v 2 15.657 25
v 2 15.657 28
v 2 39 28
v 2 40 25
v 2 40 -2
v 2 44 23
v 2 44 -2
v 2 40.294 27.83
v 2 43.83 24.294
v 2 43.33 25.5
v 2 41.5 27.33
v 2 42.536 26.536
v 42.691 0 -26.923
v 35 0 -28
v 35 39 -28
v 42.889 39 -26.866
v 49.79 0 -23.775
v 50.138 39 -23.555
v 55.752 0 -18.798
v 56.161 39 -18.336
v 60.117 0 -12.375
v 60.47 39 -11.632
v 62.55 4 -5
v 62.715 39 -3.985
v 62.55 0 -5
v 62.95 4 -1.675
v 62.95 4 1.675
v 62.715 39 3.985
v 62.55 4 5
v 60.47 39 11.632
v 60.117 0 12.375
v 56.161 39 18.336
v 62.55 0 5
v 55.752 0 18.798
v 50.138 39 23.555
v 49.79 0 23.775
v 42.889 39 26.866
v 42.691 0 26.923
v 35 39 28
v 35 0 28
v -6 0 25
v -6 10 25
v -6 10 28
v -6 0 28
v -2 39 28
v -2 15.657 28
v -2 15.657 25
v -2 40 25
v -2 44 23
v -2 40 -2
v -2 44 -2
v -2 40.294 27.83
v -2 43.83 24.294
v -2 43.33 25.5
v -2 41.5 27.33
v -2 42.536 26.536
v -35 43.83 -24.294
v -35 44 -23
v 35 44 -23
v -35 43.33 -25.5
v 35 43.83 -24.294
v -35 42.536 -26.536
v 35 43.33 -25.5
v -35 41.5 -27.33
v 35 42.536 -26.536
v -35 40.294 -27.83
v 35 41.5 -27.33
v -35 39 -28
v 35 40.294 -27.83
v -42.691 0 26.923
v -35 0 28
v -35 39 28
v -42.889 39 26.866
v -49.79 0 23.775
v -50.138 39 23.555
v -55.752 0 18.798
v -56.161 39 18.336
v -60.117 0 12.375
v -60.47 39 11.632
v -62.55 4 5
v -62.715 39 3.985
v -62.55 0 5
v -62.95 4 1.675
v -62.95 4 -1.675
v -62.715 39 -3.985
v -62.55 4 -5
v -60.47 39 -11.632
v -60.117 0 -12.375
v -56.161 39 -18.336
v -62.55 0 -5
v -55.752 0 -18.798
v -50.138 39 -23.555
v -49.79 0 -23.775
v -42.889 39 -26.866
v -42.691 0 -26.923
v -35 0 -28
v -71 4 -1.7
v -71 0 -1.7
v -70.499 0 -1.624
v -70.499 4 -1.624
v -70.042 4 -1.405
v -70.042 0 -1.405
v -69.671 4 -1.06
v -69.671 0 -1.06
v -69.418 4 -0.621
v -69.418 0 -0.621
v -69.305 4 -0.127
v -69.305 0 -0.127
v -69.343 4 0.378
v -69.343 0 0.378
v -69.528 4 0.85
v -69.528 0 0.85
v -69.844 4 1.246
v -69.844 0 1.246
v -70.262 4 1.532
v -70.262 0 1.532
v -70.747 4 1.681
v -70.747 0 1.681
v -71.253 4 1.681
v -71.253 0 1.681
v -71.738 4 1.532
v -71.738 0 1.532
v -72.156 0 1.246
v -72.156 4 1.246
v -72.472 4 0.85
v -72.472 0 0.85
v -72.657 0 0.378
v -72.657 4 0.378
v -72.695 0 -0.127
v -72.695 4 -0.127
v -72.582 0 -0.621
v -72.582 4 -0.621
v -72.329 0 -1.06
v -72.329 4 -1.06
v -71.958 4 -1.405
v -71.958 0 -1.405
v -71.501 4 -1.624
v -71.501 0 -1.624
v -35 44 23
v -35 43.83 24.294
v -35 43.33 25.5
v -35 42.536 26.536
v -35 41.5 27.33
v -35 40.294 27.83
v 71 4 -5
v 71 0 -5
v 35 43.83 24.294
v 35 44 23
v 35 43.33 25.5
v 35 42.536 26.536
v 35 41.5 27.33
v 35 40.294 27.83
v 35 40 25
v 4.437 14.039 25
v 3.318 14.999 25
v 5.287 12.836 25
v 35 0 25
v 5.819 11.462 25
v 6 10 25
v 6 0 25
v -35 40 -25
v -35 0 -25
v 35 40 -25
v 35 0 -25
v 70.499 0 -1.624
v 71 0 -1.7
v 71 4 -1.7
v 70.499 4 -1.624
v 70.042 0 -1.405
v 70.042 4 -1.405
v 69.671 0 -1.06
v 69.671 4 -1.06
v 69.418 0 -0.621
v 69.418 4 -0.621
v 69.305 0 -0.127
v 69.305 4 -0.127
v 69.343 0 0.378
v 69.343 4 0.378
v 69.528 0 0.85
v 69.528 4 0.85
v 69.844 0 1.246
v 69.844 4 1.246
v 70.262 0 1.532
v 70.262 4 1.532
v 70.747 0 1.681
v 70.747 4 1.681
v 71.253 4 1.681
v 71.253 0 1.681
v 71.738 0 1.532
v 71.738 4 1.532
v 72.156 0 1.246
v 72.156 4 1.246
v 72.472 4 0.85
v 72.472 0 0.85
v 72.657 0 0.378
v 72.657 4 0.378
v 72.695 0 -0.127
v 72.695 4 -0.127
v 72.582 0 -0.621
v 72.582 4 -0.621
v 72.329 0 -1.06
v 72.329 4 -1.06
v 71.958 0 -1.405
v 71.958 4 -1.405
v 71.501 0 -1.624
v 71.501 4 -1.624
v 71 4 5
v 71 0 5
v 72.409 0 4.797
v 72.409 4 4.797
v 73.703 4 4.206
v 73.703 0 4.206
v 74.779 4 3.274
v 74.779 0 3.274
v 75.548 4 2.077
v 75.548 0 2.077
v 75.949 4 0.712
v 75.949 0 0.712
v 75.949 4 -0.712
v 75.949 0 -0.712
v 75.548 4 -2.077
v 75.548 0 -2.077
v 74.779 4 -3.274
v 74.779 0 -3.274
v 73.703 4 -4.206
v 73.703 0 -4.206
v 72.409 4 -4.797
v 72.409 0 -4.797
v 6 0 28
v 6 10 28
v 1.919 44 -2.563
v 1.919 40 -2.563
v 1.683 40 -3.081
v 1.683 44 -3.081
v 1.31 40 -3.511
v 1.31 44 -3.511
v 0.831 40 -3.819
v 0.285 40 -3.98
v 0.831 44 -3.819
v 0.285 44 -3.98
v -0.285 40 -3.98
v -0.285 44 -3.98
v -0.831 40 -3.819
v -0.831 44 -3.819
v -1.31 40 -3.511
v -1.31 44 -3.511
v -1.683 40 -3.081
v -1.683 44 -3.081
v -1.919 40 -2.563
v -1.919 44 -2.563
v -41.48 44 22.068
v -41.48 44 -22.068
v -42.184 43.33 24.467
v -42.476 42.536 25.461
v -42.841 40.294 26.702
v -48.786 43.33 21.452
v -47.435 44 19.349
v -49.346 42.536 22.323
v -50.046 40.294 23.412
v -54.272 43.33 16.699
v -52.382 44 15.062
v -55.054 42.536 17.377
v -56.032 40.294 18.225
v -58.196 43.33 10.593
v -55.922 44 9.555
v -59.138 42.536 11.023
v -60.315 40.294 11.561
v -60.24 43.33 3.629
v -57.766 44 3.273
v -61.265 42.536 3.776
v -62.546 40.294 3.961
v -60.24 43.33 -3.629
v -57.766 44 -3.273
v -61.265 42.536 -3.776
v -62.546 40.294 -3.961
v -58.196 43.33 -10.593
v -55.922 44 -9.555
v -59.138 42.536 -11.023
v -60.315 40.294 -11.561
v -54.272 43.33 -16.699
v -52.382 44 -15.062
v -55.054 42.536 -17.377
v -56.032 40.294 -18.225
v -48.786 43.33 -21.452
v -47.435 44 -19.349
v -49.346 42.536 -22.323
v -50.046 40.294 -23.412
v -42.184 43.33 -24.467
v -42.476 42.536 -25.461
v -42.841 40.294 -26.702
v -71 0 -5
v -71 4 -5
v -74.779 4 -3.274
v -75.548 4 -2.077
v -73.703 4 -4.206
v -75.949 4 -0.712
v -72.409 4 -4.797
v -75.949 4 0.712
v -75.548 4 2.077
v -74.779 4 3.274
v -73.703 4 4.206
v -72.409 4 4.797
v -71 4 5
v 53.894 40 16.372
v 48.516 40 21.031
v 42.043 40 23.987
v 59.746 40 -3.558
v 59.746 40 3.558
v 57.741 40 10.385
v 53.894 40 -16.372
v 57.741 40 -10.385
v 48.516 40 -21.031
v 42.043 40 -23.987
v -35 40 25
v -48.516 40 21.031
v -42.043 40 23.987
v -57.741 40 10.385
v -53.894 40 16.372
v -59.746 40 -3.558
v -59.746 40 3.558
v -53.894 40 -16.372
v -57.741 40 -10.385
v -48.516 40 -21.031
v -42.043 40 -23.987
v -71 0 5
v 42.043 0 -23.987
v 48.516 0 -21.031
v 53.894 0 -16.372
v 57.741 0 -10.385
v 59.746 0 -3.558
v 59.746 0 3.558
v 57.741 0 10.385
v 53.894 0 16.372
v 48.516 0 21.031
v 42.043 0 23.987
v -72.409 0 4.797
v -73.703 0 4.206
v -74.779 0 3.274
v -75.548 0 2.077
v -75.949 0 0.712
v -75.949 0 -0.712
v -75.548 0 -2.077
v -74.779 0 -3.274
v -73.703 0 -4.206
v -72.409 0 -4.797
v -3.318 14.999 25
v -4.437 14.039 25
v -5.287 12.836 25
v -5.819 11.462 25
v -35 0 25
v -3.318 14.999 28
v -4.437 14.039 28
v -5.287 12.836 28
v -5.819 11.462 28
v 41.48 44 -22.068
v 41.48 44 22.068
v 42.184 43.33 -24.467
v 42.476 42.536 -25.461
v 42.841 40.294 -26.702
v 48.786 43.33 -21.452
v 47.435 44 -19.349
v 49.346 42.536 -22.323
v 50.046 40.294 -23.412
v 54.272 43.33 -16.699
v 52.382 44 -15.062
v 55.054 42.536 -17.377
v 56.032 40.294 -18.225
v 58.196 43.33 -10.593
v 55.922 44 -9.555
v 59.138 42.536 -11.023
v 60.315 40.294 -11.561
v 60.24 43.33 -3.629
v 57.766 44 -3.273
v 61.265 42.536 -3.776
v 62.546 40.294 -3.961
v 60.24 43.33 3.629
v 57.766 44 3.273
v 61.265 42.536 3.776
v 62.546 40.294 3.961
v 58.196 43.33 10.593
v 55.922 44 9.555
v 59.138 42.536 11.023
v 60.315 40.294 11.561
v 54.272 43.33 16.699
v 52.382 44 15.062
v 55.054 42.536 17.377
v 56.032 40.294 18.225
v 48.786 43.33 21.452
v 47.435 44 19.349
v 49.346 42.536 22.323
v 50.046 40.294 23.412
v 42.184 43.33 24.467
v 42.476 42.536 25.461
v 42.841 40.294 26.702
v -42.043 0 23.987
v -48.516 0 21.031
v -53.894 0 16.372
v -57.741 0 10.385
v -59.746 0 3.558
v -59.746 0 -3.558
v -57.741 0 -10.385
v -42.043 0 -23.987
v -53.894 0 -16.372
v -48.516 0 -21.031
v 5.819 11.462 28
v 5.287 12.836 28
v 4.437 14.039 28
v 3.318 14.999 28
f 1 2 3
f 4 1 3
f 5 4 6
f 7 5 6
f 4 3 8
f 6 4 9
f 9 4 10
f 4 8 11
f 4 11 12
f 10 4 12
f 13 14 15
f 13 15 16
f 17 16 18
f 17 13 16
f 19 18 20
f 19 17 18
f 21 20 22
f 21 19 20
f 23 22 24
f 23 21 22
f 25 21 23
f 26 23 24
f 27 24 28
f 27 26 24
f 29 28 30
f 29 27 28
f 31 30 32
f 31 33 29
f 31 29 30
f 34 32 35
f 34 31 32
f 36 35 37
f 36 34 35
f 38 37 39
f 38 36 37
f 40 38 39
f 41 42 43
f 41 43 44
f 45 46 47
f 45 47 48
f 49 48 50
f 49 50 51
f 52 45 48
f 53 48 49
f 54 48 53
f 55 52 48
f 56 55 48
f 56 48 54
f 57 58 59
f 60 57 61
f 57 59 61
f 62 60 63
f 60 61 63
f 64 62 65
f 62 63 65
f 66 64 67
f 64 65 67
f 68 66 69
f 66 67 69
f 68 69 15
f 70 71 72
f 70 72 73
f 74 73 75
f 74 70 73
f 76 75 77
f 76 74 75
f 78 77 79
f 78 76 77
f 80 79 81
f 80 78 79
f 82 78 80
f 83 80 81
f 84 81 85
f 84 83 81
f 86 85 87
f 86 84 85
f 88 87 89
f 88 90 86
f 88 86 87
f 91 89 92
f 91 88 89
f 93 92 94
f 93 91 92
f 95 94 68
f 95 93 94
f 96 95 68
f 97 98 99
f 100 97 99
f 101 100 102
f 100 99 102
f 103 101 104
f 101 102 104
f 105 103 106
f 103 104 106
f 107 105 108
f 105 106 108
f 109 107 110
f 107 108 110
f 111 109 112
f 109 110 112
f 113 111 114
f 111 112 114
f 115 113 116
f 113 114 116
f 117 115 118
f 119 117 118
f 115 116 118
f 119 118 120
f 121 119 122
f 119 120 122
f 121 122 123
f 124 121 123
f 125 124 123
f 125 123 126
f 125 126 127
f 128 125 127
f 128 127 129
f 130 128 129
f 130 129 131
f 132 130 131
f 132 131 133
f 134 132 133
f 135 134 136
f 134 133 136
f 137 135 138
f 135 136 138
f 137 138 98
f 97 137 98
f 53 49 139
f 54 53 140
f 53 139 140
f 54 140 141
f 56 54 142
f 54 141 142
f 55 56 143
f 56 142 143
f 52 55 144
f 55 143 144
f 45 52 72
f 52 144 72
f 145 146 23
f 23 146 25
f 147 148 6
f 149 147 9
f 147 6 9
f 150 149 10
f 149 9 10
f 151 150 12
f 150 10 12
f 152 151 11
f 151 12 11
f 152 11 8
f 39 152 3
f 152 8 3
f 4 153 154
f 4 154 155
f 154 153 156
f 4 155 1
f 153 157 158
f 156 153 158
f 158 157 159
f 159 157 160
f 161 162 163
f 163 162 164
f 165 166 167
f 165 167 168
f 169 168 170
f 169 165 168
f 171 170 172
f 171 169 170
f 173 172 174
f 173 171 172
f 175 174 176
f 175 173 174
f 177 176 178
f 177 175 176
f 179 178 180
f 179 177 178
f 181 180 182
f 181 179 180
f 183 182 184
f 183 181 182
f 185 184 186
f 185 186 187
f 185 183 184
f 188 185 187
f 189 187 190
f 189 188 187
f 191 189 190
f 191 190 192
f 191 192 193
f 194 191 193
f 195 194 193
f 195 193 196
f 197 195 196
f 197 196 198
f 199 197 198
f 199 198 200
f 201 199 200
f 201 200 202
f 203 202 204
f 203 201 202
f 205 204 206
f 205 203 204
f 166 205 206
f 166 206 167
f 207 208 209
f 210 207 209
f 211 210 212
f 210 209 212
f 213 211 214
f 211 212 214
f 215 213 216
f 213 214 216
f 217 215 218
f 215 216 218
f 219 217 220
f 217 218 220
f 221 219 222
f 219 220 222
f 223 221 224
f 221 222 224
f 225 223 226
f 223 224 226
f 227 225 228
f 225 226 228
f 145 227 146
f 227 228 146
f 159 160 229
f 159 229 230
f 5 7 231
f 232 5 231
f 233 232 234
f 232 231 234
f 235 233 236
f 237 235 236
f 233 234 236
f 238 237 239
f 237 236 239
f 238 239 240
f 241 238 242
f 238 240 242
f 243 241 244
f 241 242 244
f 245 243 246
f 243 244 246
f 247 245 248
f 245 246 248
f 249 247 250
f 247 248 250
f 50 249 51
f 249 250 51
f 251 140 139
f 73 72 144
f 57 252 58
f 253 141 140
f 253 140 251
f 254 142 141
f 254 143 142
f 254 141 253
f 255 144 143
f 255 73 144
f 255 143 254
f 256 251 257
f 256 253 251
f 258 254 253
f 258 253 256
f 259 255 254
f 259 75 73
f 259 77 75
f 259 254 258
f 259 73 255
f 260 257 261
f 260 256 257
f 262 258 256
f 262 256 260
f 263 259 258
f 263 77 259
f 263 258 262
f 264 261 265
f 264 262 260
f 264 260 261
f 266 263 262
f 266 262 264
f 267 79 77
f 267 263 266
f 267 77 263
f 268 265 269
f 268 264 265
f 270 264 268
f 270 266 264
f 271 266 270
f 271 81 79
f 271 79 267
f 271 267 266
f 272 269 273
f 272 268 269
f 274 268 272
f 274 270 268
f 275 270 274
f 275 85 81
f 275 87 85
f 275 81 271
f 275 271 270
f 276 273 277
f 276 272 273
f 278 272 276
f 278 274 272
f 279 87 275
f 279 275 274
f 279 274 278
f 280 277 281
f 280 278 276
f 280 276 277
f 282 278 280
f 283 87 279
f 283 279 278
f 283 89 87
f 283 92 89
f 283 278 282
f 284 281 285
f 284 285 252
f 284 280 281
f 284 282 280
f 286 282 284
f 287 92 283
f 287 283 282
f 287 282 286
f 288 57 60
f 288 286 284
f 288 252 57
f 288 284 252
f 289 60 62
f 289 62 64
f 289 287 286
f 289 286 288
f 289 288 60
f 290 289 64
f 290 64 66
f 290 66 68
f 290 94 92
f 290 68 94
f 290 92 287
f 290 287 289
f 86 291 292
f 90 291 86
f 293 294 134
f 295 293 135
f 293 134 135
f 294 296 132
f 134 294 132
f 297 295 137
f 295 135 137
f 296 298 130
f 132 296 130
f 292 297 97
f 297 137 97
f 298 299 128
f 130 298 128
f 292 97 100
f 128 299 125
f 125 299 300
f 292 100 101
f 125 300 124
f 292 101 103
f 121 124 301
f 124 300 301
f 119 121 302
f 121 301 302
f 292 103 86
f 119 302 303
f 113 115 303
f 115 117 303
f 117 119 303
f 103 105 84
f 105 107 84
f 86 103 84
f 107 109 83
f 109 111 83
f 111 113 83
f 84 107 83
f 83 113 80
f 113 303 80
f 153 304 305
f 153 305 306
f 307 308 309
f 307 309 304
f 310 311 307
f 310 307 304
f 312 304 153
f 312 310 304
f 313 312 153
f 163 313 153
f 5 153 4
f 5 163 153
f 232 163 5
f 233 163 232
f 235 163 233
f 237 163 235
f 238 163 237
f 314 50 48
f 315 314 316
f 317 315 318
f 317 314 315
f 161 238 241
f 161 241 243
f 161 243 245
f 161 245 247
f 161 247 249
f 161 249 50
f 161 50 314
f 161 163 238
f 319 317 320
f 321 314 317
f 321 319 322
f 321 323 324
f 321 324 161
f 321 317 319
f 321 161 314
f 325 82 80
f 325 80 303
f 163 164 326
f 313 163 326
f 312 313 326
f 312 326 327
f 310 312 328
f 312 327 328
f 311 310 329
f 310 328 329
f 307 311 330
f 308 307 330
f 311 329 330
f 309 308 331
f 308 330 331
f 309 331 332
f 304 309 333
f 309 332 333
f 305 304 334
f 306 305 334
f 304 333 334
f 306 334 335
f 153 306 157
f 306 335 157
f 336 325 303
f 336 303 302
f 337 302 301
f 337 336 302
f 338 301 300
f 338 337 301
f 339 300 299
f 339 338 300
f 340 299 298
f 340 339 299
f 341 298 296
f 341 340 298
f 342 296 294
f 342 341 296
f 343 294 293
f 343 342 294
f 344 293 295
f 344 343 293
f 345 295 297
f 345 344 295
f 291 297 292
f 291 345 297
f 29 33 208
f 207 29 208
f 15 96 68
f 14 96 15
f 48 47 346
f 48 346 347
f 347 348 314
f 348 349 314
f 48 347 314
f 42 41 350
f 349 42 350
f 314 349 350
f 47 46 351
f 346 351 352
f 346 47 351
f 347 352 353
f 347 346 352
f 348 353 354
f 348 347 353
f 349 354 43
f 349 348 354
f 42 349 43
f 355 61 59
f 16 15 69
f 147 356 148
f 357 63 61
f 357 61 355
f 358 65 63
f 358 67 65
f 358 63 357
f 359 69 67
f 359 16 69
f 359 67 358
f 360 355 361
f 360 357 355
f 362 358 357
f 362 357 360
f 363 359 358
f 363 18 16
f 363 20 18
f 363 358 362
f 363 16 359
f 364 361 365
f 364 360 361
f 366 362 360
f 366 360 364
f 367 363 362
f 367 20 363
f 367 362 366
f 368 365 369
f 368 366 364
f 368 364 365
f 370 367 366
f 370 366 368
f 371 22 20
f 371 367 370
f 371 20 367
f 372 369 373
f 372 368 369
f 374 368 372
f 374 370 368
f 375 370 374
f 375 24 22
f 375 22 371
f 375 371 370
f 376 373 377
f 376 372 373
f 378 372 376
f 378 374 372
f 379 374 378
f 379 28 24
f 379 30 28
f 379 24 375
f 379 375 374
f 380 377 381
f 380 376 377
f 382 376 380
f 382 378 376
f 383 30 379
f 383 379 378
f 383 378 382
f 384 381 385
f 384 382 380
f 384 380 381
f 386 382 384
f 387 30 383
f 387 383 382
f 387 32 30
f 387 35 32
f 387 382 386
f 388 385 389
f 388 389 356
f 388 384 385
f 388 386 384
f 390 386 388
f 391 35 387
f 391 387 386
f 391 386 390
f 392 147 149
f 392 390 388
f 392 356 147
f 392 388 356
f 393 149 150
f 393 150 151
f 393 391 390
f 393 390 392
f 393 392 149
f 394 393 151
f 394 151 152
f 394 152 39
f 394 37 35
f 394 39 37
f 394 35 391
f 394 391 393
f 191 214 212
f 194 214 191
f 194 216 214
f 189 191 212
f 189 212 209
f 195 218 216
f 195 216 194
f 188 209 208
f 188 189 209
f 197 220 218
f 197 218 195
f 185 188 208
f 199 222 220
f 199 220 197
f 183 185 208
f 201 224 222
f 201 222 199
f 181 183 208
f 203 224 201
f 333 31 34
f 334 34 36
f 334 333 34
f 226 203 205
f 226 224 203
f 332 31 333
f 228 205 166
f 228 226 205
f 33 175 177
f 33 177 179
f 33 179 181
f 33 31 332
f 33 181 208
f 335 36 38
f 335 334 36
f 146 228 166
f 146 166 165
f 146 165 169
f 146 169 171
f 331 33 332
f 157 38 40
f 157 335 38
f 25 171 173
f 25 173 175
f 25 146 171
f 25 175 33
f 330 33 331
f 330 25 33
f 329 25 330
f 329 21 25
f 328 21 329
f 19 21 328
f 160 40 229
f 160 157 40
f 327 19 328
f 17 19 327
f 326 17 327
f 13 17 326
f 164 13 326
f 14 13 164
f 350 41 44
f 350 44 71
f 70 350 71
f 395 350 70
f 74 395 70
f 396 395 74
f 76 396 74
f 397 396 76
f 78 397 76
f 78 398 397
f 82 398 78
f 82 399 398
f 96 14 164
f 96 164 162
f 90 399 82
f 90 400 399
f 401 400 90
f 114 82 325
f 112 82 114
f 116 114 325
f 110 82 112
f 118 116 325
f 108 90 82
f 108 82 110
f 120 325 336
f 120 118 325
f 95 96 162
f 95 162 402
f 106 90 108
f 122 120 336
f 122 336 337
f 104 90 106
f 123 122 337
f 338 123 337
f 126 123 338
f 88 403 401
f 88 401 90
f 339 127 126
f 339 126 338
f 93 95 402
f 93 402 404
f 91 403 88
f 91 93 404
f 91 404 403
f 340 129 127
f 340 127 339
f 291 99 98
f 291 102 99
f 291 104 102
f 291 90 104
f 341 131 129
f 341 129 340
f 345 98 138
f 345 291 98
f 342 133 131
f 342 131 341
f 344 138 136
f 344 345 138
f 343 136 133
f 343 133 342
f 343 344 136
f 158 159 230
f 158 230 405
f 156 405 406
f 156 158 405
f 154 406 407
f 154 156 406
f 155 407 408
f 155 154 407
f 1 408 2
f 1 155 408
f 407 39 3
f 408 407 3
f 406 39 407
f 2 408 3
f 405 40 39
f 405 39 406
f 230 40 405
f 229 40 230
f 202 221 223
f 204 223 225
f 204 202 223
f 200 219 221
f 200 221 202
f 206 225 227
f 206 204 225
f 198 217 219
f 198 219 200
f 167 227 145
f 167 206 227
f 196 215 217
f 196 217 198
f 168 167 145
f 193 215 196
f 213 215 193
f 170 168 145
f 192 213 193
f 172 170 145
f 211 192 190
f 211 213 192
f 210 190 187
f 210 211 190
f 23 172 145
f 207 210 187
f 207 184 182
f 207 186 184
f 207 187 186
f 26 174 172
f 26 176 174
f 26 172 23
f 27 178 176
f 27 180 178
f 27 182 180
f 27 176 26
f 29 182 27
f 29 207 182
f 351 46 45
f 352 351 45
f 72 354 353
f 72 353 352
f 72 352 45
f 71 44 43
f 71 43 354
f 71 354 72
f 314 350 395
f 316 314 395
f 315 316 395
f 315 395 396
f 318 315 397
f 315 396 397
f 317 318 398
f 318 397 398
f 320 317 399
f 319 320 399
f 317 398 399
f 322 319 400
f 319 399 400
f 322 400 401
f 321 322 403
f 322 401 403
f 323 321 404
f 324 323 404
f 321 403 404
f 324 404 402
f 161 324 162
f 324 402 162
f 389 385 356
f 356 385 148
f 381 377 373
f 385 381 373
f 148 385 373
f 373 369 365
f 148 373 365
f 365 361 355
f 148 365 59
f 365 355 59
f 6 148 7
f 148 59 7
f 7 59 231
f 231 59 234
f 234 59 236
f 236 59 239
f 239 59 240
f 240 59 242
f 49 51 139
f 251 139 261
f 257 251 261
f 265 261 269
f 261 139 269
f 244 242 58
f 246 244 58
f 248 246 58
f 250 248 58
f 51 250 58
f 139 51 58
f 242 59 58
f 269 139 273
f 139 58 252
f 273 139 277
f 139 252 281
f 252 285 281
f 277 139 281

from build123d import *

# Parameters (mm, degrees)
BOSS_EXTRUDE1_DEPTH = 40
BOSS_EXTRUDE2_START = 40
BOSS_EXTRUDE2_DEPTH = 4
SKETCH3_R           = 1.7
BOSS_EXTRUDE3_DEPTH = 4
CUT_EXTRUDE1_DEPTH  = 4
SKETCH5_W           = 4
SKETCH5_H           = 44
CUT_EXTRUDE2_DEPTH  = 30
SKETCH6_R           = 2
CUT_EXTRUDE3_DEPTH  = 93.173748974
FILLET1_R           = 5


with BuildPart() as part:
    # Sketch1 → Boss-Extrude1 (new body)
    with BuildSketch(Plane(origin=(0, 0, 0), x_dir=(1, 0, 0), z_dir=(0, 1, 0))):
        with BuildLine():
            Line((-35, 28), (35, 28))
            ThreePointArc((35, 28), (63, 0), (35, -28))
            Line((35, -28), (-35, -28))
            ThreePointArc((-35, -28), (-63, 0), (-35, 28))
        make_face()
        with BuildLine():
            Line((-35, 25), (35, 25))
            ThreePointArc((35, 25), (60, 0), (35, -25))
            Line((35, -25), (-35, -25))
            ThreePointArc((-35, -25), (-60, 0), (-35, 25))
        make_face(mode=Mode.SUBTRACT)
    extrude(amount=BOSS_EXTRUDE1_DEPTH)

    # Sketch1<2> → Boss-Extrude2 (add)
    with BuildSketch(Plane(origin=(0, 0, 0), x_dir=(1, 0, 0), z_dir=(0, 1, 0)).offset(BOSS_EXTRUDE2_START)):
        with BuildLine():
            Line((-35, 28), (35, 28))
            ThreePointArc((35, 28), (63, 0), (35, -28))
            Line((35, -28), (-35, -28))
            ThreePointArc((-35, -28), (-63, 0), (-35, 28))
        make_face()
    extrude(amount=BOSS_EXTRUDE2_DEPTH)

    # Sketch3 → Boss-Extrude3 (add)
    with BuildSketch(Plane.XZ):
        with BuildLine():
            Line((-62.549954628, 5), (-71, 5))
            ThreePointArc((-71, 5), (-76, 0), (-71, -5))
            Line((-71, -5), (-62.549954628, -5))
            ThreePointArc((-62.549954628, -5), (-63, 0), (-62.549954628, 5))
        make_face()
        with Locations(Location((-71, 0, 0), (0, 0, 270))):
            Circle(SKETCH3_R, mode=Mode.SUBTRACT)
    boss_extrude3 = extrude(amount=-BOSS_EXTRUDE3_DEPTH)

    # Mirror1: Boss-Extrude3 across plane
    add(boss_extrude3.mirror(Plane(origin=(0, 0, 0), x_dir=(0, 0, 1), z_dir=(1, 0, 0))))

    # Sketch4 → Cut-Extrude1 (cut)
    with BuildSketch(Plane(origin=(0, 0, 25), x_dir=(-1, 0, 0), z_dir=(0, 0, -1))):
        with BuildLine():
            Line((6, 10), (6, 0))
            Line((6, 0), (-6, 0))
            Line((-6, 0), (-6, 10))
            ThreePointArc((-6, 10), (0, 16), (6, 10))
        make_face()
    extrude(amount=-CUT_EXTRUDE1_DEPTH, mode=Mode.SUBTRACT)

    # Sketch5 → Cut-Extrude2 (cut)
    with BuildSketch(Plane.XY.offset(28)):
        with Locations((0, 22)):
            Rectangle(SKETCH5_W, SKETCH5_H)
    extrude(amount=-CUT_EXTRUDE2_DEPTH, mode=Mode.SUBTRACT)

    # Sketch6 → Cut-Extrude3 (cut, through all)
    with BuildSketch(Plane(origin=(0, 44, 0), x_dir=(1, 0, 0), z_dir=(0, 1, 0))):
        with Locations((0, 2)):
            Circle(SKETCH6_R)
    extrude(amount=-CUT_EXTRUDE3_DEPTH, mode=Mode.SUBTRACT)

    # Fillet1
    fillet1_edges = [part.edges().sort_by_distance(p)[0] for p in [
        (18.5, 44, 28),
        (-63, 44, 0),
        (0, 44, -28),
        (63, 44, 0),
    ]]
    fillet(fillet1_edges, radius=FILLET1_R)


solid = part.part
